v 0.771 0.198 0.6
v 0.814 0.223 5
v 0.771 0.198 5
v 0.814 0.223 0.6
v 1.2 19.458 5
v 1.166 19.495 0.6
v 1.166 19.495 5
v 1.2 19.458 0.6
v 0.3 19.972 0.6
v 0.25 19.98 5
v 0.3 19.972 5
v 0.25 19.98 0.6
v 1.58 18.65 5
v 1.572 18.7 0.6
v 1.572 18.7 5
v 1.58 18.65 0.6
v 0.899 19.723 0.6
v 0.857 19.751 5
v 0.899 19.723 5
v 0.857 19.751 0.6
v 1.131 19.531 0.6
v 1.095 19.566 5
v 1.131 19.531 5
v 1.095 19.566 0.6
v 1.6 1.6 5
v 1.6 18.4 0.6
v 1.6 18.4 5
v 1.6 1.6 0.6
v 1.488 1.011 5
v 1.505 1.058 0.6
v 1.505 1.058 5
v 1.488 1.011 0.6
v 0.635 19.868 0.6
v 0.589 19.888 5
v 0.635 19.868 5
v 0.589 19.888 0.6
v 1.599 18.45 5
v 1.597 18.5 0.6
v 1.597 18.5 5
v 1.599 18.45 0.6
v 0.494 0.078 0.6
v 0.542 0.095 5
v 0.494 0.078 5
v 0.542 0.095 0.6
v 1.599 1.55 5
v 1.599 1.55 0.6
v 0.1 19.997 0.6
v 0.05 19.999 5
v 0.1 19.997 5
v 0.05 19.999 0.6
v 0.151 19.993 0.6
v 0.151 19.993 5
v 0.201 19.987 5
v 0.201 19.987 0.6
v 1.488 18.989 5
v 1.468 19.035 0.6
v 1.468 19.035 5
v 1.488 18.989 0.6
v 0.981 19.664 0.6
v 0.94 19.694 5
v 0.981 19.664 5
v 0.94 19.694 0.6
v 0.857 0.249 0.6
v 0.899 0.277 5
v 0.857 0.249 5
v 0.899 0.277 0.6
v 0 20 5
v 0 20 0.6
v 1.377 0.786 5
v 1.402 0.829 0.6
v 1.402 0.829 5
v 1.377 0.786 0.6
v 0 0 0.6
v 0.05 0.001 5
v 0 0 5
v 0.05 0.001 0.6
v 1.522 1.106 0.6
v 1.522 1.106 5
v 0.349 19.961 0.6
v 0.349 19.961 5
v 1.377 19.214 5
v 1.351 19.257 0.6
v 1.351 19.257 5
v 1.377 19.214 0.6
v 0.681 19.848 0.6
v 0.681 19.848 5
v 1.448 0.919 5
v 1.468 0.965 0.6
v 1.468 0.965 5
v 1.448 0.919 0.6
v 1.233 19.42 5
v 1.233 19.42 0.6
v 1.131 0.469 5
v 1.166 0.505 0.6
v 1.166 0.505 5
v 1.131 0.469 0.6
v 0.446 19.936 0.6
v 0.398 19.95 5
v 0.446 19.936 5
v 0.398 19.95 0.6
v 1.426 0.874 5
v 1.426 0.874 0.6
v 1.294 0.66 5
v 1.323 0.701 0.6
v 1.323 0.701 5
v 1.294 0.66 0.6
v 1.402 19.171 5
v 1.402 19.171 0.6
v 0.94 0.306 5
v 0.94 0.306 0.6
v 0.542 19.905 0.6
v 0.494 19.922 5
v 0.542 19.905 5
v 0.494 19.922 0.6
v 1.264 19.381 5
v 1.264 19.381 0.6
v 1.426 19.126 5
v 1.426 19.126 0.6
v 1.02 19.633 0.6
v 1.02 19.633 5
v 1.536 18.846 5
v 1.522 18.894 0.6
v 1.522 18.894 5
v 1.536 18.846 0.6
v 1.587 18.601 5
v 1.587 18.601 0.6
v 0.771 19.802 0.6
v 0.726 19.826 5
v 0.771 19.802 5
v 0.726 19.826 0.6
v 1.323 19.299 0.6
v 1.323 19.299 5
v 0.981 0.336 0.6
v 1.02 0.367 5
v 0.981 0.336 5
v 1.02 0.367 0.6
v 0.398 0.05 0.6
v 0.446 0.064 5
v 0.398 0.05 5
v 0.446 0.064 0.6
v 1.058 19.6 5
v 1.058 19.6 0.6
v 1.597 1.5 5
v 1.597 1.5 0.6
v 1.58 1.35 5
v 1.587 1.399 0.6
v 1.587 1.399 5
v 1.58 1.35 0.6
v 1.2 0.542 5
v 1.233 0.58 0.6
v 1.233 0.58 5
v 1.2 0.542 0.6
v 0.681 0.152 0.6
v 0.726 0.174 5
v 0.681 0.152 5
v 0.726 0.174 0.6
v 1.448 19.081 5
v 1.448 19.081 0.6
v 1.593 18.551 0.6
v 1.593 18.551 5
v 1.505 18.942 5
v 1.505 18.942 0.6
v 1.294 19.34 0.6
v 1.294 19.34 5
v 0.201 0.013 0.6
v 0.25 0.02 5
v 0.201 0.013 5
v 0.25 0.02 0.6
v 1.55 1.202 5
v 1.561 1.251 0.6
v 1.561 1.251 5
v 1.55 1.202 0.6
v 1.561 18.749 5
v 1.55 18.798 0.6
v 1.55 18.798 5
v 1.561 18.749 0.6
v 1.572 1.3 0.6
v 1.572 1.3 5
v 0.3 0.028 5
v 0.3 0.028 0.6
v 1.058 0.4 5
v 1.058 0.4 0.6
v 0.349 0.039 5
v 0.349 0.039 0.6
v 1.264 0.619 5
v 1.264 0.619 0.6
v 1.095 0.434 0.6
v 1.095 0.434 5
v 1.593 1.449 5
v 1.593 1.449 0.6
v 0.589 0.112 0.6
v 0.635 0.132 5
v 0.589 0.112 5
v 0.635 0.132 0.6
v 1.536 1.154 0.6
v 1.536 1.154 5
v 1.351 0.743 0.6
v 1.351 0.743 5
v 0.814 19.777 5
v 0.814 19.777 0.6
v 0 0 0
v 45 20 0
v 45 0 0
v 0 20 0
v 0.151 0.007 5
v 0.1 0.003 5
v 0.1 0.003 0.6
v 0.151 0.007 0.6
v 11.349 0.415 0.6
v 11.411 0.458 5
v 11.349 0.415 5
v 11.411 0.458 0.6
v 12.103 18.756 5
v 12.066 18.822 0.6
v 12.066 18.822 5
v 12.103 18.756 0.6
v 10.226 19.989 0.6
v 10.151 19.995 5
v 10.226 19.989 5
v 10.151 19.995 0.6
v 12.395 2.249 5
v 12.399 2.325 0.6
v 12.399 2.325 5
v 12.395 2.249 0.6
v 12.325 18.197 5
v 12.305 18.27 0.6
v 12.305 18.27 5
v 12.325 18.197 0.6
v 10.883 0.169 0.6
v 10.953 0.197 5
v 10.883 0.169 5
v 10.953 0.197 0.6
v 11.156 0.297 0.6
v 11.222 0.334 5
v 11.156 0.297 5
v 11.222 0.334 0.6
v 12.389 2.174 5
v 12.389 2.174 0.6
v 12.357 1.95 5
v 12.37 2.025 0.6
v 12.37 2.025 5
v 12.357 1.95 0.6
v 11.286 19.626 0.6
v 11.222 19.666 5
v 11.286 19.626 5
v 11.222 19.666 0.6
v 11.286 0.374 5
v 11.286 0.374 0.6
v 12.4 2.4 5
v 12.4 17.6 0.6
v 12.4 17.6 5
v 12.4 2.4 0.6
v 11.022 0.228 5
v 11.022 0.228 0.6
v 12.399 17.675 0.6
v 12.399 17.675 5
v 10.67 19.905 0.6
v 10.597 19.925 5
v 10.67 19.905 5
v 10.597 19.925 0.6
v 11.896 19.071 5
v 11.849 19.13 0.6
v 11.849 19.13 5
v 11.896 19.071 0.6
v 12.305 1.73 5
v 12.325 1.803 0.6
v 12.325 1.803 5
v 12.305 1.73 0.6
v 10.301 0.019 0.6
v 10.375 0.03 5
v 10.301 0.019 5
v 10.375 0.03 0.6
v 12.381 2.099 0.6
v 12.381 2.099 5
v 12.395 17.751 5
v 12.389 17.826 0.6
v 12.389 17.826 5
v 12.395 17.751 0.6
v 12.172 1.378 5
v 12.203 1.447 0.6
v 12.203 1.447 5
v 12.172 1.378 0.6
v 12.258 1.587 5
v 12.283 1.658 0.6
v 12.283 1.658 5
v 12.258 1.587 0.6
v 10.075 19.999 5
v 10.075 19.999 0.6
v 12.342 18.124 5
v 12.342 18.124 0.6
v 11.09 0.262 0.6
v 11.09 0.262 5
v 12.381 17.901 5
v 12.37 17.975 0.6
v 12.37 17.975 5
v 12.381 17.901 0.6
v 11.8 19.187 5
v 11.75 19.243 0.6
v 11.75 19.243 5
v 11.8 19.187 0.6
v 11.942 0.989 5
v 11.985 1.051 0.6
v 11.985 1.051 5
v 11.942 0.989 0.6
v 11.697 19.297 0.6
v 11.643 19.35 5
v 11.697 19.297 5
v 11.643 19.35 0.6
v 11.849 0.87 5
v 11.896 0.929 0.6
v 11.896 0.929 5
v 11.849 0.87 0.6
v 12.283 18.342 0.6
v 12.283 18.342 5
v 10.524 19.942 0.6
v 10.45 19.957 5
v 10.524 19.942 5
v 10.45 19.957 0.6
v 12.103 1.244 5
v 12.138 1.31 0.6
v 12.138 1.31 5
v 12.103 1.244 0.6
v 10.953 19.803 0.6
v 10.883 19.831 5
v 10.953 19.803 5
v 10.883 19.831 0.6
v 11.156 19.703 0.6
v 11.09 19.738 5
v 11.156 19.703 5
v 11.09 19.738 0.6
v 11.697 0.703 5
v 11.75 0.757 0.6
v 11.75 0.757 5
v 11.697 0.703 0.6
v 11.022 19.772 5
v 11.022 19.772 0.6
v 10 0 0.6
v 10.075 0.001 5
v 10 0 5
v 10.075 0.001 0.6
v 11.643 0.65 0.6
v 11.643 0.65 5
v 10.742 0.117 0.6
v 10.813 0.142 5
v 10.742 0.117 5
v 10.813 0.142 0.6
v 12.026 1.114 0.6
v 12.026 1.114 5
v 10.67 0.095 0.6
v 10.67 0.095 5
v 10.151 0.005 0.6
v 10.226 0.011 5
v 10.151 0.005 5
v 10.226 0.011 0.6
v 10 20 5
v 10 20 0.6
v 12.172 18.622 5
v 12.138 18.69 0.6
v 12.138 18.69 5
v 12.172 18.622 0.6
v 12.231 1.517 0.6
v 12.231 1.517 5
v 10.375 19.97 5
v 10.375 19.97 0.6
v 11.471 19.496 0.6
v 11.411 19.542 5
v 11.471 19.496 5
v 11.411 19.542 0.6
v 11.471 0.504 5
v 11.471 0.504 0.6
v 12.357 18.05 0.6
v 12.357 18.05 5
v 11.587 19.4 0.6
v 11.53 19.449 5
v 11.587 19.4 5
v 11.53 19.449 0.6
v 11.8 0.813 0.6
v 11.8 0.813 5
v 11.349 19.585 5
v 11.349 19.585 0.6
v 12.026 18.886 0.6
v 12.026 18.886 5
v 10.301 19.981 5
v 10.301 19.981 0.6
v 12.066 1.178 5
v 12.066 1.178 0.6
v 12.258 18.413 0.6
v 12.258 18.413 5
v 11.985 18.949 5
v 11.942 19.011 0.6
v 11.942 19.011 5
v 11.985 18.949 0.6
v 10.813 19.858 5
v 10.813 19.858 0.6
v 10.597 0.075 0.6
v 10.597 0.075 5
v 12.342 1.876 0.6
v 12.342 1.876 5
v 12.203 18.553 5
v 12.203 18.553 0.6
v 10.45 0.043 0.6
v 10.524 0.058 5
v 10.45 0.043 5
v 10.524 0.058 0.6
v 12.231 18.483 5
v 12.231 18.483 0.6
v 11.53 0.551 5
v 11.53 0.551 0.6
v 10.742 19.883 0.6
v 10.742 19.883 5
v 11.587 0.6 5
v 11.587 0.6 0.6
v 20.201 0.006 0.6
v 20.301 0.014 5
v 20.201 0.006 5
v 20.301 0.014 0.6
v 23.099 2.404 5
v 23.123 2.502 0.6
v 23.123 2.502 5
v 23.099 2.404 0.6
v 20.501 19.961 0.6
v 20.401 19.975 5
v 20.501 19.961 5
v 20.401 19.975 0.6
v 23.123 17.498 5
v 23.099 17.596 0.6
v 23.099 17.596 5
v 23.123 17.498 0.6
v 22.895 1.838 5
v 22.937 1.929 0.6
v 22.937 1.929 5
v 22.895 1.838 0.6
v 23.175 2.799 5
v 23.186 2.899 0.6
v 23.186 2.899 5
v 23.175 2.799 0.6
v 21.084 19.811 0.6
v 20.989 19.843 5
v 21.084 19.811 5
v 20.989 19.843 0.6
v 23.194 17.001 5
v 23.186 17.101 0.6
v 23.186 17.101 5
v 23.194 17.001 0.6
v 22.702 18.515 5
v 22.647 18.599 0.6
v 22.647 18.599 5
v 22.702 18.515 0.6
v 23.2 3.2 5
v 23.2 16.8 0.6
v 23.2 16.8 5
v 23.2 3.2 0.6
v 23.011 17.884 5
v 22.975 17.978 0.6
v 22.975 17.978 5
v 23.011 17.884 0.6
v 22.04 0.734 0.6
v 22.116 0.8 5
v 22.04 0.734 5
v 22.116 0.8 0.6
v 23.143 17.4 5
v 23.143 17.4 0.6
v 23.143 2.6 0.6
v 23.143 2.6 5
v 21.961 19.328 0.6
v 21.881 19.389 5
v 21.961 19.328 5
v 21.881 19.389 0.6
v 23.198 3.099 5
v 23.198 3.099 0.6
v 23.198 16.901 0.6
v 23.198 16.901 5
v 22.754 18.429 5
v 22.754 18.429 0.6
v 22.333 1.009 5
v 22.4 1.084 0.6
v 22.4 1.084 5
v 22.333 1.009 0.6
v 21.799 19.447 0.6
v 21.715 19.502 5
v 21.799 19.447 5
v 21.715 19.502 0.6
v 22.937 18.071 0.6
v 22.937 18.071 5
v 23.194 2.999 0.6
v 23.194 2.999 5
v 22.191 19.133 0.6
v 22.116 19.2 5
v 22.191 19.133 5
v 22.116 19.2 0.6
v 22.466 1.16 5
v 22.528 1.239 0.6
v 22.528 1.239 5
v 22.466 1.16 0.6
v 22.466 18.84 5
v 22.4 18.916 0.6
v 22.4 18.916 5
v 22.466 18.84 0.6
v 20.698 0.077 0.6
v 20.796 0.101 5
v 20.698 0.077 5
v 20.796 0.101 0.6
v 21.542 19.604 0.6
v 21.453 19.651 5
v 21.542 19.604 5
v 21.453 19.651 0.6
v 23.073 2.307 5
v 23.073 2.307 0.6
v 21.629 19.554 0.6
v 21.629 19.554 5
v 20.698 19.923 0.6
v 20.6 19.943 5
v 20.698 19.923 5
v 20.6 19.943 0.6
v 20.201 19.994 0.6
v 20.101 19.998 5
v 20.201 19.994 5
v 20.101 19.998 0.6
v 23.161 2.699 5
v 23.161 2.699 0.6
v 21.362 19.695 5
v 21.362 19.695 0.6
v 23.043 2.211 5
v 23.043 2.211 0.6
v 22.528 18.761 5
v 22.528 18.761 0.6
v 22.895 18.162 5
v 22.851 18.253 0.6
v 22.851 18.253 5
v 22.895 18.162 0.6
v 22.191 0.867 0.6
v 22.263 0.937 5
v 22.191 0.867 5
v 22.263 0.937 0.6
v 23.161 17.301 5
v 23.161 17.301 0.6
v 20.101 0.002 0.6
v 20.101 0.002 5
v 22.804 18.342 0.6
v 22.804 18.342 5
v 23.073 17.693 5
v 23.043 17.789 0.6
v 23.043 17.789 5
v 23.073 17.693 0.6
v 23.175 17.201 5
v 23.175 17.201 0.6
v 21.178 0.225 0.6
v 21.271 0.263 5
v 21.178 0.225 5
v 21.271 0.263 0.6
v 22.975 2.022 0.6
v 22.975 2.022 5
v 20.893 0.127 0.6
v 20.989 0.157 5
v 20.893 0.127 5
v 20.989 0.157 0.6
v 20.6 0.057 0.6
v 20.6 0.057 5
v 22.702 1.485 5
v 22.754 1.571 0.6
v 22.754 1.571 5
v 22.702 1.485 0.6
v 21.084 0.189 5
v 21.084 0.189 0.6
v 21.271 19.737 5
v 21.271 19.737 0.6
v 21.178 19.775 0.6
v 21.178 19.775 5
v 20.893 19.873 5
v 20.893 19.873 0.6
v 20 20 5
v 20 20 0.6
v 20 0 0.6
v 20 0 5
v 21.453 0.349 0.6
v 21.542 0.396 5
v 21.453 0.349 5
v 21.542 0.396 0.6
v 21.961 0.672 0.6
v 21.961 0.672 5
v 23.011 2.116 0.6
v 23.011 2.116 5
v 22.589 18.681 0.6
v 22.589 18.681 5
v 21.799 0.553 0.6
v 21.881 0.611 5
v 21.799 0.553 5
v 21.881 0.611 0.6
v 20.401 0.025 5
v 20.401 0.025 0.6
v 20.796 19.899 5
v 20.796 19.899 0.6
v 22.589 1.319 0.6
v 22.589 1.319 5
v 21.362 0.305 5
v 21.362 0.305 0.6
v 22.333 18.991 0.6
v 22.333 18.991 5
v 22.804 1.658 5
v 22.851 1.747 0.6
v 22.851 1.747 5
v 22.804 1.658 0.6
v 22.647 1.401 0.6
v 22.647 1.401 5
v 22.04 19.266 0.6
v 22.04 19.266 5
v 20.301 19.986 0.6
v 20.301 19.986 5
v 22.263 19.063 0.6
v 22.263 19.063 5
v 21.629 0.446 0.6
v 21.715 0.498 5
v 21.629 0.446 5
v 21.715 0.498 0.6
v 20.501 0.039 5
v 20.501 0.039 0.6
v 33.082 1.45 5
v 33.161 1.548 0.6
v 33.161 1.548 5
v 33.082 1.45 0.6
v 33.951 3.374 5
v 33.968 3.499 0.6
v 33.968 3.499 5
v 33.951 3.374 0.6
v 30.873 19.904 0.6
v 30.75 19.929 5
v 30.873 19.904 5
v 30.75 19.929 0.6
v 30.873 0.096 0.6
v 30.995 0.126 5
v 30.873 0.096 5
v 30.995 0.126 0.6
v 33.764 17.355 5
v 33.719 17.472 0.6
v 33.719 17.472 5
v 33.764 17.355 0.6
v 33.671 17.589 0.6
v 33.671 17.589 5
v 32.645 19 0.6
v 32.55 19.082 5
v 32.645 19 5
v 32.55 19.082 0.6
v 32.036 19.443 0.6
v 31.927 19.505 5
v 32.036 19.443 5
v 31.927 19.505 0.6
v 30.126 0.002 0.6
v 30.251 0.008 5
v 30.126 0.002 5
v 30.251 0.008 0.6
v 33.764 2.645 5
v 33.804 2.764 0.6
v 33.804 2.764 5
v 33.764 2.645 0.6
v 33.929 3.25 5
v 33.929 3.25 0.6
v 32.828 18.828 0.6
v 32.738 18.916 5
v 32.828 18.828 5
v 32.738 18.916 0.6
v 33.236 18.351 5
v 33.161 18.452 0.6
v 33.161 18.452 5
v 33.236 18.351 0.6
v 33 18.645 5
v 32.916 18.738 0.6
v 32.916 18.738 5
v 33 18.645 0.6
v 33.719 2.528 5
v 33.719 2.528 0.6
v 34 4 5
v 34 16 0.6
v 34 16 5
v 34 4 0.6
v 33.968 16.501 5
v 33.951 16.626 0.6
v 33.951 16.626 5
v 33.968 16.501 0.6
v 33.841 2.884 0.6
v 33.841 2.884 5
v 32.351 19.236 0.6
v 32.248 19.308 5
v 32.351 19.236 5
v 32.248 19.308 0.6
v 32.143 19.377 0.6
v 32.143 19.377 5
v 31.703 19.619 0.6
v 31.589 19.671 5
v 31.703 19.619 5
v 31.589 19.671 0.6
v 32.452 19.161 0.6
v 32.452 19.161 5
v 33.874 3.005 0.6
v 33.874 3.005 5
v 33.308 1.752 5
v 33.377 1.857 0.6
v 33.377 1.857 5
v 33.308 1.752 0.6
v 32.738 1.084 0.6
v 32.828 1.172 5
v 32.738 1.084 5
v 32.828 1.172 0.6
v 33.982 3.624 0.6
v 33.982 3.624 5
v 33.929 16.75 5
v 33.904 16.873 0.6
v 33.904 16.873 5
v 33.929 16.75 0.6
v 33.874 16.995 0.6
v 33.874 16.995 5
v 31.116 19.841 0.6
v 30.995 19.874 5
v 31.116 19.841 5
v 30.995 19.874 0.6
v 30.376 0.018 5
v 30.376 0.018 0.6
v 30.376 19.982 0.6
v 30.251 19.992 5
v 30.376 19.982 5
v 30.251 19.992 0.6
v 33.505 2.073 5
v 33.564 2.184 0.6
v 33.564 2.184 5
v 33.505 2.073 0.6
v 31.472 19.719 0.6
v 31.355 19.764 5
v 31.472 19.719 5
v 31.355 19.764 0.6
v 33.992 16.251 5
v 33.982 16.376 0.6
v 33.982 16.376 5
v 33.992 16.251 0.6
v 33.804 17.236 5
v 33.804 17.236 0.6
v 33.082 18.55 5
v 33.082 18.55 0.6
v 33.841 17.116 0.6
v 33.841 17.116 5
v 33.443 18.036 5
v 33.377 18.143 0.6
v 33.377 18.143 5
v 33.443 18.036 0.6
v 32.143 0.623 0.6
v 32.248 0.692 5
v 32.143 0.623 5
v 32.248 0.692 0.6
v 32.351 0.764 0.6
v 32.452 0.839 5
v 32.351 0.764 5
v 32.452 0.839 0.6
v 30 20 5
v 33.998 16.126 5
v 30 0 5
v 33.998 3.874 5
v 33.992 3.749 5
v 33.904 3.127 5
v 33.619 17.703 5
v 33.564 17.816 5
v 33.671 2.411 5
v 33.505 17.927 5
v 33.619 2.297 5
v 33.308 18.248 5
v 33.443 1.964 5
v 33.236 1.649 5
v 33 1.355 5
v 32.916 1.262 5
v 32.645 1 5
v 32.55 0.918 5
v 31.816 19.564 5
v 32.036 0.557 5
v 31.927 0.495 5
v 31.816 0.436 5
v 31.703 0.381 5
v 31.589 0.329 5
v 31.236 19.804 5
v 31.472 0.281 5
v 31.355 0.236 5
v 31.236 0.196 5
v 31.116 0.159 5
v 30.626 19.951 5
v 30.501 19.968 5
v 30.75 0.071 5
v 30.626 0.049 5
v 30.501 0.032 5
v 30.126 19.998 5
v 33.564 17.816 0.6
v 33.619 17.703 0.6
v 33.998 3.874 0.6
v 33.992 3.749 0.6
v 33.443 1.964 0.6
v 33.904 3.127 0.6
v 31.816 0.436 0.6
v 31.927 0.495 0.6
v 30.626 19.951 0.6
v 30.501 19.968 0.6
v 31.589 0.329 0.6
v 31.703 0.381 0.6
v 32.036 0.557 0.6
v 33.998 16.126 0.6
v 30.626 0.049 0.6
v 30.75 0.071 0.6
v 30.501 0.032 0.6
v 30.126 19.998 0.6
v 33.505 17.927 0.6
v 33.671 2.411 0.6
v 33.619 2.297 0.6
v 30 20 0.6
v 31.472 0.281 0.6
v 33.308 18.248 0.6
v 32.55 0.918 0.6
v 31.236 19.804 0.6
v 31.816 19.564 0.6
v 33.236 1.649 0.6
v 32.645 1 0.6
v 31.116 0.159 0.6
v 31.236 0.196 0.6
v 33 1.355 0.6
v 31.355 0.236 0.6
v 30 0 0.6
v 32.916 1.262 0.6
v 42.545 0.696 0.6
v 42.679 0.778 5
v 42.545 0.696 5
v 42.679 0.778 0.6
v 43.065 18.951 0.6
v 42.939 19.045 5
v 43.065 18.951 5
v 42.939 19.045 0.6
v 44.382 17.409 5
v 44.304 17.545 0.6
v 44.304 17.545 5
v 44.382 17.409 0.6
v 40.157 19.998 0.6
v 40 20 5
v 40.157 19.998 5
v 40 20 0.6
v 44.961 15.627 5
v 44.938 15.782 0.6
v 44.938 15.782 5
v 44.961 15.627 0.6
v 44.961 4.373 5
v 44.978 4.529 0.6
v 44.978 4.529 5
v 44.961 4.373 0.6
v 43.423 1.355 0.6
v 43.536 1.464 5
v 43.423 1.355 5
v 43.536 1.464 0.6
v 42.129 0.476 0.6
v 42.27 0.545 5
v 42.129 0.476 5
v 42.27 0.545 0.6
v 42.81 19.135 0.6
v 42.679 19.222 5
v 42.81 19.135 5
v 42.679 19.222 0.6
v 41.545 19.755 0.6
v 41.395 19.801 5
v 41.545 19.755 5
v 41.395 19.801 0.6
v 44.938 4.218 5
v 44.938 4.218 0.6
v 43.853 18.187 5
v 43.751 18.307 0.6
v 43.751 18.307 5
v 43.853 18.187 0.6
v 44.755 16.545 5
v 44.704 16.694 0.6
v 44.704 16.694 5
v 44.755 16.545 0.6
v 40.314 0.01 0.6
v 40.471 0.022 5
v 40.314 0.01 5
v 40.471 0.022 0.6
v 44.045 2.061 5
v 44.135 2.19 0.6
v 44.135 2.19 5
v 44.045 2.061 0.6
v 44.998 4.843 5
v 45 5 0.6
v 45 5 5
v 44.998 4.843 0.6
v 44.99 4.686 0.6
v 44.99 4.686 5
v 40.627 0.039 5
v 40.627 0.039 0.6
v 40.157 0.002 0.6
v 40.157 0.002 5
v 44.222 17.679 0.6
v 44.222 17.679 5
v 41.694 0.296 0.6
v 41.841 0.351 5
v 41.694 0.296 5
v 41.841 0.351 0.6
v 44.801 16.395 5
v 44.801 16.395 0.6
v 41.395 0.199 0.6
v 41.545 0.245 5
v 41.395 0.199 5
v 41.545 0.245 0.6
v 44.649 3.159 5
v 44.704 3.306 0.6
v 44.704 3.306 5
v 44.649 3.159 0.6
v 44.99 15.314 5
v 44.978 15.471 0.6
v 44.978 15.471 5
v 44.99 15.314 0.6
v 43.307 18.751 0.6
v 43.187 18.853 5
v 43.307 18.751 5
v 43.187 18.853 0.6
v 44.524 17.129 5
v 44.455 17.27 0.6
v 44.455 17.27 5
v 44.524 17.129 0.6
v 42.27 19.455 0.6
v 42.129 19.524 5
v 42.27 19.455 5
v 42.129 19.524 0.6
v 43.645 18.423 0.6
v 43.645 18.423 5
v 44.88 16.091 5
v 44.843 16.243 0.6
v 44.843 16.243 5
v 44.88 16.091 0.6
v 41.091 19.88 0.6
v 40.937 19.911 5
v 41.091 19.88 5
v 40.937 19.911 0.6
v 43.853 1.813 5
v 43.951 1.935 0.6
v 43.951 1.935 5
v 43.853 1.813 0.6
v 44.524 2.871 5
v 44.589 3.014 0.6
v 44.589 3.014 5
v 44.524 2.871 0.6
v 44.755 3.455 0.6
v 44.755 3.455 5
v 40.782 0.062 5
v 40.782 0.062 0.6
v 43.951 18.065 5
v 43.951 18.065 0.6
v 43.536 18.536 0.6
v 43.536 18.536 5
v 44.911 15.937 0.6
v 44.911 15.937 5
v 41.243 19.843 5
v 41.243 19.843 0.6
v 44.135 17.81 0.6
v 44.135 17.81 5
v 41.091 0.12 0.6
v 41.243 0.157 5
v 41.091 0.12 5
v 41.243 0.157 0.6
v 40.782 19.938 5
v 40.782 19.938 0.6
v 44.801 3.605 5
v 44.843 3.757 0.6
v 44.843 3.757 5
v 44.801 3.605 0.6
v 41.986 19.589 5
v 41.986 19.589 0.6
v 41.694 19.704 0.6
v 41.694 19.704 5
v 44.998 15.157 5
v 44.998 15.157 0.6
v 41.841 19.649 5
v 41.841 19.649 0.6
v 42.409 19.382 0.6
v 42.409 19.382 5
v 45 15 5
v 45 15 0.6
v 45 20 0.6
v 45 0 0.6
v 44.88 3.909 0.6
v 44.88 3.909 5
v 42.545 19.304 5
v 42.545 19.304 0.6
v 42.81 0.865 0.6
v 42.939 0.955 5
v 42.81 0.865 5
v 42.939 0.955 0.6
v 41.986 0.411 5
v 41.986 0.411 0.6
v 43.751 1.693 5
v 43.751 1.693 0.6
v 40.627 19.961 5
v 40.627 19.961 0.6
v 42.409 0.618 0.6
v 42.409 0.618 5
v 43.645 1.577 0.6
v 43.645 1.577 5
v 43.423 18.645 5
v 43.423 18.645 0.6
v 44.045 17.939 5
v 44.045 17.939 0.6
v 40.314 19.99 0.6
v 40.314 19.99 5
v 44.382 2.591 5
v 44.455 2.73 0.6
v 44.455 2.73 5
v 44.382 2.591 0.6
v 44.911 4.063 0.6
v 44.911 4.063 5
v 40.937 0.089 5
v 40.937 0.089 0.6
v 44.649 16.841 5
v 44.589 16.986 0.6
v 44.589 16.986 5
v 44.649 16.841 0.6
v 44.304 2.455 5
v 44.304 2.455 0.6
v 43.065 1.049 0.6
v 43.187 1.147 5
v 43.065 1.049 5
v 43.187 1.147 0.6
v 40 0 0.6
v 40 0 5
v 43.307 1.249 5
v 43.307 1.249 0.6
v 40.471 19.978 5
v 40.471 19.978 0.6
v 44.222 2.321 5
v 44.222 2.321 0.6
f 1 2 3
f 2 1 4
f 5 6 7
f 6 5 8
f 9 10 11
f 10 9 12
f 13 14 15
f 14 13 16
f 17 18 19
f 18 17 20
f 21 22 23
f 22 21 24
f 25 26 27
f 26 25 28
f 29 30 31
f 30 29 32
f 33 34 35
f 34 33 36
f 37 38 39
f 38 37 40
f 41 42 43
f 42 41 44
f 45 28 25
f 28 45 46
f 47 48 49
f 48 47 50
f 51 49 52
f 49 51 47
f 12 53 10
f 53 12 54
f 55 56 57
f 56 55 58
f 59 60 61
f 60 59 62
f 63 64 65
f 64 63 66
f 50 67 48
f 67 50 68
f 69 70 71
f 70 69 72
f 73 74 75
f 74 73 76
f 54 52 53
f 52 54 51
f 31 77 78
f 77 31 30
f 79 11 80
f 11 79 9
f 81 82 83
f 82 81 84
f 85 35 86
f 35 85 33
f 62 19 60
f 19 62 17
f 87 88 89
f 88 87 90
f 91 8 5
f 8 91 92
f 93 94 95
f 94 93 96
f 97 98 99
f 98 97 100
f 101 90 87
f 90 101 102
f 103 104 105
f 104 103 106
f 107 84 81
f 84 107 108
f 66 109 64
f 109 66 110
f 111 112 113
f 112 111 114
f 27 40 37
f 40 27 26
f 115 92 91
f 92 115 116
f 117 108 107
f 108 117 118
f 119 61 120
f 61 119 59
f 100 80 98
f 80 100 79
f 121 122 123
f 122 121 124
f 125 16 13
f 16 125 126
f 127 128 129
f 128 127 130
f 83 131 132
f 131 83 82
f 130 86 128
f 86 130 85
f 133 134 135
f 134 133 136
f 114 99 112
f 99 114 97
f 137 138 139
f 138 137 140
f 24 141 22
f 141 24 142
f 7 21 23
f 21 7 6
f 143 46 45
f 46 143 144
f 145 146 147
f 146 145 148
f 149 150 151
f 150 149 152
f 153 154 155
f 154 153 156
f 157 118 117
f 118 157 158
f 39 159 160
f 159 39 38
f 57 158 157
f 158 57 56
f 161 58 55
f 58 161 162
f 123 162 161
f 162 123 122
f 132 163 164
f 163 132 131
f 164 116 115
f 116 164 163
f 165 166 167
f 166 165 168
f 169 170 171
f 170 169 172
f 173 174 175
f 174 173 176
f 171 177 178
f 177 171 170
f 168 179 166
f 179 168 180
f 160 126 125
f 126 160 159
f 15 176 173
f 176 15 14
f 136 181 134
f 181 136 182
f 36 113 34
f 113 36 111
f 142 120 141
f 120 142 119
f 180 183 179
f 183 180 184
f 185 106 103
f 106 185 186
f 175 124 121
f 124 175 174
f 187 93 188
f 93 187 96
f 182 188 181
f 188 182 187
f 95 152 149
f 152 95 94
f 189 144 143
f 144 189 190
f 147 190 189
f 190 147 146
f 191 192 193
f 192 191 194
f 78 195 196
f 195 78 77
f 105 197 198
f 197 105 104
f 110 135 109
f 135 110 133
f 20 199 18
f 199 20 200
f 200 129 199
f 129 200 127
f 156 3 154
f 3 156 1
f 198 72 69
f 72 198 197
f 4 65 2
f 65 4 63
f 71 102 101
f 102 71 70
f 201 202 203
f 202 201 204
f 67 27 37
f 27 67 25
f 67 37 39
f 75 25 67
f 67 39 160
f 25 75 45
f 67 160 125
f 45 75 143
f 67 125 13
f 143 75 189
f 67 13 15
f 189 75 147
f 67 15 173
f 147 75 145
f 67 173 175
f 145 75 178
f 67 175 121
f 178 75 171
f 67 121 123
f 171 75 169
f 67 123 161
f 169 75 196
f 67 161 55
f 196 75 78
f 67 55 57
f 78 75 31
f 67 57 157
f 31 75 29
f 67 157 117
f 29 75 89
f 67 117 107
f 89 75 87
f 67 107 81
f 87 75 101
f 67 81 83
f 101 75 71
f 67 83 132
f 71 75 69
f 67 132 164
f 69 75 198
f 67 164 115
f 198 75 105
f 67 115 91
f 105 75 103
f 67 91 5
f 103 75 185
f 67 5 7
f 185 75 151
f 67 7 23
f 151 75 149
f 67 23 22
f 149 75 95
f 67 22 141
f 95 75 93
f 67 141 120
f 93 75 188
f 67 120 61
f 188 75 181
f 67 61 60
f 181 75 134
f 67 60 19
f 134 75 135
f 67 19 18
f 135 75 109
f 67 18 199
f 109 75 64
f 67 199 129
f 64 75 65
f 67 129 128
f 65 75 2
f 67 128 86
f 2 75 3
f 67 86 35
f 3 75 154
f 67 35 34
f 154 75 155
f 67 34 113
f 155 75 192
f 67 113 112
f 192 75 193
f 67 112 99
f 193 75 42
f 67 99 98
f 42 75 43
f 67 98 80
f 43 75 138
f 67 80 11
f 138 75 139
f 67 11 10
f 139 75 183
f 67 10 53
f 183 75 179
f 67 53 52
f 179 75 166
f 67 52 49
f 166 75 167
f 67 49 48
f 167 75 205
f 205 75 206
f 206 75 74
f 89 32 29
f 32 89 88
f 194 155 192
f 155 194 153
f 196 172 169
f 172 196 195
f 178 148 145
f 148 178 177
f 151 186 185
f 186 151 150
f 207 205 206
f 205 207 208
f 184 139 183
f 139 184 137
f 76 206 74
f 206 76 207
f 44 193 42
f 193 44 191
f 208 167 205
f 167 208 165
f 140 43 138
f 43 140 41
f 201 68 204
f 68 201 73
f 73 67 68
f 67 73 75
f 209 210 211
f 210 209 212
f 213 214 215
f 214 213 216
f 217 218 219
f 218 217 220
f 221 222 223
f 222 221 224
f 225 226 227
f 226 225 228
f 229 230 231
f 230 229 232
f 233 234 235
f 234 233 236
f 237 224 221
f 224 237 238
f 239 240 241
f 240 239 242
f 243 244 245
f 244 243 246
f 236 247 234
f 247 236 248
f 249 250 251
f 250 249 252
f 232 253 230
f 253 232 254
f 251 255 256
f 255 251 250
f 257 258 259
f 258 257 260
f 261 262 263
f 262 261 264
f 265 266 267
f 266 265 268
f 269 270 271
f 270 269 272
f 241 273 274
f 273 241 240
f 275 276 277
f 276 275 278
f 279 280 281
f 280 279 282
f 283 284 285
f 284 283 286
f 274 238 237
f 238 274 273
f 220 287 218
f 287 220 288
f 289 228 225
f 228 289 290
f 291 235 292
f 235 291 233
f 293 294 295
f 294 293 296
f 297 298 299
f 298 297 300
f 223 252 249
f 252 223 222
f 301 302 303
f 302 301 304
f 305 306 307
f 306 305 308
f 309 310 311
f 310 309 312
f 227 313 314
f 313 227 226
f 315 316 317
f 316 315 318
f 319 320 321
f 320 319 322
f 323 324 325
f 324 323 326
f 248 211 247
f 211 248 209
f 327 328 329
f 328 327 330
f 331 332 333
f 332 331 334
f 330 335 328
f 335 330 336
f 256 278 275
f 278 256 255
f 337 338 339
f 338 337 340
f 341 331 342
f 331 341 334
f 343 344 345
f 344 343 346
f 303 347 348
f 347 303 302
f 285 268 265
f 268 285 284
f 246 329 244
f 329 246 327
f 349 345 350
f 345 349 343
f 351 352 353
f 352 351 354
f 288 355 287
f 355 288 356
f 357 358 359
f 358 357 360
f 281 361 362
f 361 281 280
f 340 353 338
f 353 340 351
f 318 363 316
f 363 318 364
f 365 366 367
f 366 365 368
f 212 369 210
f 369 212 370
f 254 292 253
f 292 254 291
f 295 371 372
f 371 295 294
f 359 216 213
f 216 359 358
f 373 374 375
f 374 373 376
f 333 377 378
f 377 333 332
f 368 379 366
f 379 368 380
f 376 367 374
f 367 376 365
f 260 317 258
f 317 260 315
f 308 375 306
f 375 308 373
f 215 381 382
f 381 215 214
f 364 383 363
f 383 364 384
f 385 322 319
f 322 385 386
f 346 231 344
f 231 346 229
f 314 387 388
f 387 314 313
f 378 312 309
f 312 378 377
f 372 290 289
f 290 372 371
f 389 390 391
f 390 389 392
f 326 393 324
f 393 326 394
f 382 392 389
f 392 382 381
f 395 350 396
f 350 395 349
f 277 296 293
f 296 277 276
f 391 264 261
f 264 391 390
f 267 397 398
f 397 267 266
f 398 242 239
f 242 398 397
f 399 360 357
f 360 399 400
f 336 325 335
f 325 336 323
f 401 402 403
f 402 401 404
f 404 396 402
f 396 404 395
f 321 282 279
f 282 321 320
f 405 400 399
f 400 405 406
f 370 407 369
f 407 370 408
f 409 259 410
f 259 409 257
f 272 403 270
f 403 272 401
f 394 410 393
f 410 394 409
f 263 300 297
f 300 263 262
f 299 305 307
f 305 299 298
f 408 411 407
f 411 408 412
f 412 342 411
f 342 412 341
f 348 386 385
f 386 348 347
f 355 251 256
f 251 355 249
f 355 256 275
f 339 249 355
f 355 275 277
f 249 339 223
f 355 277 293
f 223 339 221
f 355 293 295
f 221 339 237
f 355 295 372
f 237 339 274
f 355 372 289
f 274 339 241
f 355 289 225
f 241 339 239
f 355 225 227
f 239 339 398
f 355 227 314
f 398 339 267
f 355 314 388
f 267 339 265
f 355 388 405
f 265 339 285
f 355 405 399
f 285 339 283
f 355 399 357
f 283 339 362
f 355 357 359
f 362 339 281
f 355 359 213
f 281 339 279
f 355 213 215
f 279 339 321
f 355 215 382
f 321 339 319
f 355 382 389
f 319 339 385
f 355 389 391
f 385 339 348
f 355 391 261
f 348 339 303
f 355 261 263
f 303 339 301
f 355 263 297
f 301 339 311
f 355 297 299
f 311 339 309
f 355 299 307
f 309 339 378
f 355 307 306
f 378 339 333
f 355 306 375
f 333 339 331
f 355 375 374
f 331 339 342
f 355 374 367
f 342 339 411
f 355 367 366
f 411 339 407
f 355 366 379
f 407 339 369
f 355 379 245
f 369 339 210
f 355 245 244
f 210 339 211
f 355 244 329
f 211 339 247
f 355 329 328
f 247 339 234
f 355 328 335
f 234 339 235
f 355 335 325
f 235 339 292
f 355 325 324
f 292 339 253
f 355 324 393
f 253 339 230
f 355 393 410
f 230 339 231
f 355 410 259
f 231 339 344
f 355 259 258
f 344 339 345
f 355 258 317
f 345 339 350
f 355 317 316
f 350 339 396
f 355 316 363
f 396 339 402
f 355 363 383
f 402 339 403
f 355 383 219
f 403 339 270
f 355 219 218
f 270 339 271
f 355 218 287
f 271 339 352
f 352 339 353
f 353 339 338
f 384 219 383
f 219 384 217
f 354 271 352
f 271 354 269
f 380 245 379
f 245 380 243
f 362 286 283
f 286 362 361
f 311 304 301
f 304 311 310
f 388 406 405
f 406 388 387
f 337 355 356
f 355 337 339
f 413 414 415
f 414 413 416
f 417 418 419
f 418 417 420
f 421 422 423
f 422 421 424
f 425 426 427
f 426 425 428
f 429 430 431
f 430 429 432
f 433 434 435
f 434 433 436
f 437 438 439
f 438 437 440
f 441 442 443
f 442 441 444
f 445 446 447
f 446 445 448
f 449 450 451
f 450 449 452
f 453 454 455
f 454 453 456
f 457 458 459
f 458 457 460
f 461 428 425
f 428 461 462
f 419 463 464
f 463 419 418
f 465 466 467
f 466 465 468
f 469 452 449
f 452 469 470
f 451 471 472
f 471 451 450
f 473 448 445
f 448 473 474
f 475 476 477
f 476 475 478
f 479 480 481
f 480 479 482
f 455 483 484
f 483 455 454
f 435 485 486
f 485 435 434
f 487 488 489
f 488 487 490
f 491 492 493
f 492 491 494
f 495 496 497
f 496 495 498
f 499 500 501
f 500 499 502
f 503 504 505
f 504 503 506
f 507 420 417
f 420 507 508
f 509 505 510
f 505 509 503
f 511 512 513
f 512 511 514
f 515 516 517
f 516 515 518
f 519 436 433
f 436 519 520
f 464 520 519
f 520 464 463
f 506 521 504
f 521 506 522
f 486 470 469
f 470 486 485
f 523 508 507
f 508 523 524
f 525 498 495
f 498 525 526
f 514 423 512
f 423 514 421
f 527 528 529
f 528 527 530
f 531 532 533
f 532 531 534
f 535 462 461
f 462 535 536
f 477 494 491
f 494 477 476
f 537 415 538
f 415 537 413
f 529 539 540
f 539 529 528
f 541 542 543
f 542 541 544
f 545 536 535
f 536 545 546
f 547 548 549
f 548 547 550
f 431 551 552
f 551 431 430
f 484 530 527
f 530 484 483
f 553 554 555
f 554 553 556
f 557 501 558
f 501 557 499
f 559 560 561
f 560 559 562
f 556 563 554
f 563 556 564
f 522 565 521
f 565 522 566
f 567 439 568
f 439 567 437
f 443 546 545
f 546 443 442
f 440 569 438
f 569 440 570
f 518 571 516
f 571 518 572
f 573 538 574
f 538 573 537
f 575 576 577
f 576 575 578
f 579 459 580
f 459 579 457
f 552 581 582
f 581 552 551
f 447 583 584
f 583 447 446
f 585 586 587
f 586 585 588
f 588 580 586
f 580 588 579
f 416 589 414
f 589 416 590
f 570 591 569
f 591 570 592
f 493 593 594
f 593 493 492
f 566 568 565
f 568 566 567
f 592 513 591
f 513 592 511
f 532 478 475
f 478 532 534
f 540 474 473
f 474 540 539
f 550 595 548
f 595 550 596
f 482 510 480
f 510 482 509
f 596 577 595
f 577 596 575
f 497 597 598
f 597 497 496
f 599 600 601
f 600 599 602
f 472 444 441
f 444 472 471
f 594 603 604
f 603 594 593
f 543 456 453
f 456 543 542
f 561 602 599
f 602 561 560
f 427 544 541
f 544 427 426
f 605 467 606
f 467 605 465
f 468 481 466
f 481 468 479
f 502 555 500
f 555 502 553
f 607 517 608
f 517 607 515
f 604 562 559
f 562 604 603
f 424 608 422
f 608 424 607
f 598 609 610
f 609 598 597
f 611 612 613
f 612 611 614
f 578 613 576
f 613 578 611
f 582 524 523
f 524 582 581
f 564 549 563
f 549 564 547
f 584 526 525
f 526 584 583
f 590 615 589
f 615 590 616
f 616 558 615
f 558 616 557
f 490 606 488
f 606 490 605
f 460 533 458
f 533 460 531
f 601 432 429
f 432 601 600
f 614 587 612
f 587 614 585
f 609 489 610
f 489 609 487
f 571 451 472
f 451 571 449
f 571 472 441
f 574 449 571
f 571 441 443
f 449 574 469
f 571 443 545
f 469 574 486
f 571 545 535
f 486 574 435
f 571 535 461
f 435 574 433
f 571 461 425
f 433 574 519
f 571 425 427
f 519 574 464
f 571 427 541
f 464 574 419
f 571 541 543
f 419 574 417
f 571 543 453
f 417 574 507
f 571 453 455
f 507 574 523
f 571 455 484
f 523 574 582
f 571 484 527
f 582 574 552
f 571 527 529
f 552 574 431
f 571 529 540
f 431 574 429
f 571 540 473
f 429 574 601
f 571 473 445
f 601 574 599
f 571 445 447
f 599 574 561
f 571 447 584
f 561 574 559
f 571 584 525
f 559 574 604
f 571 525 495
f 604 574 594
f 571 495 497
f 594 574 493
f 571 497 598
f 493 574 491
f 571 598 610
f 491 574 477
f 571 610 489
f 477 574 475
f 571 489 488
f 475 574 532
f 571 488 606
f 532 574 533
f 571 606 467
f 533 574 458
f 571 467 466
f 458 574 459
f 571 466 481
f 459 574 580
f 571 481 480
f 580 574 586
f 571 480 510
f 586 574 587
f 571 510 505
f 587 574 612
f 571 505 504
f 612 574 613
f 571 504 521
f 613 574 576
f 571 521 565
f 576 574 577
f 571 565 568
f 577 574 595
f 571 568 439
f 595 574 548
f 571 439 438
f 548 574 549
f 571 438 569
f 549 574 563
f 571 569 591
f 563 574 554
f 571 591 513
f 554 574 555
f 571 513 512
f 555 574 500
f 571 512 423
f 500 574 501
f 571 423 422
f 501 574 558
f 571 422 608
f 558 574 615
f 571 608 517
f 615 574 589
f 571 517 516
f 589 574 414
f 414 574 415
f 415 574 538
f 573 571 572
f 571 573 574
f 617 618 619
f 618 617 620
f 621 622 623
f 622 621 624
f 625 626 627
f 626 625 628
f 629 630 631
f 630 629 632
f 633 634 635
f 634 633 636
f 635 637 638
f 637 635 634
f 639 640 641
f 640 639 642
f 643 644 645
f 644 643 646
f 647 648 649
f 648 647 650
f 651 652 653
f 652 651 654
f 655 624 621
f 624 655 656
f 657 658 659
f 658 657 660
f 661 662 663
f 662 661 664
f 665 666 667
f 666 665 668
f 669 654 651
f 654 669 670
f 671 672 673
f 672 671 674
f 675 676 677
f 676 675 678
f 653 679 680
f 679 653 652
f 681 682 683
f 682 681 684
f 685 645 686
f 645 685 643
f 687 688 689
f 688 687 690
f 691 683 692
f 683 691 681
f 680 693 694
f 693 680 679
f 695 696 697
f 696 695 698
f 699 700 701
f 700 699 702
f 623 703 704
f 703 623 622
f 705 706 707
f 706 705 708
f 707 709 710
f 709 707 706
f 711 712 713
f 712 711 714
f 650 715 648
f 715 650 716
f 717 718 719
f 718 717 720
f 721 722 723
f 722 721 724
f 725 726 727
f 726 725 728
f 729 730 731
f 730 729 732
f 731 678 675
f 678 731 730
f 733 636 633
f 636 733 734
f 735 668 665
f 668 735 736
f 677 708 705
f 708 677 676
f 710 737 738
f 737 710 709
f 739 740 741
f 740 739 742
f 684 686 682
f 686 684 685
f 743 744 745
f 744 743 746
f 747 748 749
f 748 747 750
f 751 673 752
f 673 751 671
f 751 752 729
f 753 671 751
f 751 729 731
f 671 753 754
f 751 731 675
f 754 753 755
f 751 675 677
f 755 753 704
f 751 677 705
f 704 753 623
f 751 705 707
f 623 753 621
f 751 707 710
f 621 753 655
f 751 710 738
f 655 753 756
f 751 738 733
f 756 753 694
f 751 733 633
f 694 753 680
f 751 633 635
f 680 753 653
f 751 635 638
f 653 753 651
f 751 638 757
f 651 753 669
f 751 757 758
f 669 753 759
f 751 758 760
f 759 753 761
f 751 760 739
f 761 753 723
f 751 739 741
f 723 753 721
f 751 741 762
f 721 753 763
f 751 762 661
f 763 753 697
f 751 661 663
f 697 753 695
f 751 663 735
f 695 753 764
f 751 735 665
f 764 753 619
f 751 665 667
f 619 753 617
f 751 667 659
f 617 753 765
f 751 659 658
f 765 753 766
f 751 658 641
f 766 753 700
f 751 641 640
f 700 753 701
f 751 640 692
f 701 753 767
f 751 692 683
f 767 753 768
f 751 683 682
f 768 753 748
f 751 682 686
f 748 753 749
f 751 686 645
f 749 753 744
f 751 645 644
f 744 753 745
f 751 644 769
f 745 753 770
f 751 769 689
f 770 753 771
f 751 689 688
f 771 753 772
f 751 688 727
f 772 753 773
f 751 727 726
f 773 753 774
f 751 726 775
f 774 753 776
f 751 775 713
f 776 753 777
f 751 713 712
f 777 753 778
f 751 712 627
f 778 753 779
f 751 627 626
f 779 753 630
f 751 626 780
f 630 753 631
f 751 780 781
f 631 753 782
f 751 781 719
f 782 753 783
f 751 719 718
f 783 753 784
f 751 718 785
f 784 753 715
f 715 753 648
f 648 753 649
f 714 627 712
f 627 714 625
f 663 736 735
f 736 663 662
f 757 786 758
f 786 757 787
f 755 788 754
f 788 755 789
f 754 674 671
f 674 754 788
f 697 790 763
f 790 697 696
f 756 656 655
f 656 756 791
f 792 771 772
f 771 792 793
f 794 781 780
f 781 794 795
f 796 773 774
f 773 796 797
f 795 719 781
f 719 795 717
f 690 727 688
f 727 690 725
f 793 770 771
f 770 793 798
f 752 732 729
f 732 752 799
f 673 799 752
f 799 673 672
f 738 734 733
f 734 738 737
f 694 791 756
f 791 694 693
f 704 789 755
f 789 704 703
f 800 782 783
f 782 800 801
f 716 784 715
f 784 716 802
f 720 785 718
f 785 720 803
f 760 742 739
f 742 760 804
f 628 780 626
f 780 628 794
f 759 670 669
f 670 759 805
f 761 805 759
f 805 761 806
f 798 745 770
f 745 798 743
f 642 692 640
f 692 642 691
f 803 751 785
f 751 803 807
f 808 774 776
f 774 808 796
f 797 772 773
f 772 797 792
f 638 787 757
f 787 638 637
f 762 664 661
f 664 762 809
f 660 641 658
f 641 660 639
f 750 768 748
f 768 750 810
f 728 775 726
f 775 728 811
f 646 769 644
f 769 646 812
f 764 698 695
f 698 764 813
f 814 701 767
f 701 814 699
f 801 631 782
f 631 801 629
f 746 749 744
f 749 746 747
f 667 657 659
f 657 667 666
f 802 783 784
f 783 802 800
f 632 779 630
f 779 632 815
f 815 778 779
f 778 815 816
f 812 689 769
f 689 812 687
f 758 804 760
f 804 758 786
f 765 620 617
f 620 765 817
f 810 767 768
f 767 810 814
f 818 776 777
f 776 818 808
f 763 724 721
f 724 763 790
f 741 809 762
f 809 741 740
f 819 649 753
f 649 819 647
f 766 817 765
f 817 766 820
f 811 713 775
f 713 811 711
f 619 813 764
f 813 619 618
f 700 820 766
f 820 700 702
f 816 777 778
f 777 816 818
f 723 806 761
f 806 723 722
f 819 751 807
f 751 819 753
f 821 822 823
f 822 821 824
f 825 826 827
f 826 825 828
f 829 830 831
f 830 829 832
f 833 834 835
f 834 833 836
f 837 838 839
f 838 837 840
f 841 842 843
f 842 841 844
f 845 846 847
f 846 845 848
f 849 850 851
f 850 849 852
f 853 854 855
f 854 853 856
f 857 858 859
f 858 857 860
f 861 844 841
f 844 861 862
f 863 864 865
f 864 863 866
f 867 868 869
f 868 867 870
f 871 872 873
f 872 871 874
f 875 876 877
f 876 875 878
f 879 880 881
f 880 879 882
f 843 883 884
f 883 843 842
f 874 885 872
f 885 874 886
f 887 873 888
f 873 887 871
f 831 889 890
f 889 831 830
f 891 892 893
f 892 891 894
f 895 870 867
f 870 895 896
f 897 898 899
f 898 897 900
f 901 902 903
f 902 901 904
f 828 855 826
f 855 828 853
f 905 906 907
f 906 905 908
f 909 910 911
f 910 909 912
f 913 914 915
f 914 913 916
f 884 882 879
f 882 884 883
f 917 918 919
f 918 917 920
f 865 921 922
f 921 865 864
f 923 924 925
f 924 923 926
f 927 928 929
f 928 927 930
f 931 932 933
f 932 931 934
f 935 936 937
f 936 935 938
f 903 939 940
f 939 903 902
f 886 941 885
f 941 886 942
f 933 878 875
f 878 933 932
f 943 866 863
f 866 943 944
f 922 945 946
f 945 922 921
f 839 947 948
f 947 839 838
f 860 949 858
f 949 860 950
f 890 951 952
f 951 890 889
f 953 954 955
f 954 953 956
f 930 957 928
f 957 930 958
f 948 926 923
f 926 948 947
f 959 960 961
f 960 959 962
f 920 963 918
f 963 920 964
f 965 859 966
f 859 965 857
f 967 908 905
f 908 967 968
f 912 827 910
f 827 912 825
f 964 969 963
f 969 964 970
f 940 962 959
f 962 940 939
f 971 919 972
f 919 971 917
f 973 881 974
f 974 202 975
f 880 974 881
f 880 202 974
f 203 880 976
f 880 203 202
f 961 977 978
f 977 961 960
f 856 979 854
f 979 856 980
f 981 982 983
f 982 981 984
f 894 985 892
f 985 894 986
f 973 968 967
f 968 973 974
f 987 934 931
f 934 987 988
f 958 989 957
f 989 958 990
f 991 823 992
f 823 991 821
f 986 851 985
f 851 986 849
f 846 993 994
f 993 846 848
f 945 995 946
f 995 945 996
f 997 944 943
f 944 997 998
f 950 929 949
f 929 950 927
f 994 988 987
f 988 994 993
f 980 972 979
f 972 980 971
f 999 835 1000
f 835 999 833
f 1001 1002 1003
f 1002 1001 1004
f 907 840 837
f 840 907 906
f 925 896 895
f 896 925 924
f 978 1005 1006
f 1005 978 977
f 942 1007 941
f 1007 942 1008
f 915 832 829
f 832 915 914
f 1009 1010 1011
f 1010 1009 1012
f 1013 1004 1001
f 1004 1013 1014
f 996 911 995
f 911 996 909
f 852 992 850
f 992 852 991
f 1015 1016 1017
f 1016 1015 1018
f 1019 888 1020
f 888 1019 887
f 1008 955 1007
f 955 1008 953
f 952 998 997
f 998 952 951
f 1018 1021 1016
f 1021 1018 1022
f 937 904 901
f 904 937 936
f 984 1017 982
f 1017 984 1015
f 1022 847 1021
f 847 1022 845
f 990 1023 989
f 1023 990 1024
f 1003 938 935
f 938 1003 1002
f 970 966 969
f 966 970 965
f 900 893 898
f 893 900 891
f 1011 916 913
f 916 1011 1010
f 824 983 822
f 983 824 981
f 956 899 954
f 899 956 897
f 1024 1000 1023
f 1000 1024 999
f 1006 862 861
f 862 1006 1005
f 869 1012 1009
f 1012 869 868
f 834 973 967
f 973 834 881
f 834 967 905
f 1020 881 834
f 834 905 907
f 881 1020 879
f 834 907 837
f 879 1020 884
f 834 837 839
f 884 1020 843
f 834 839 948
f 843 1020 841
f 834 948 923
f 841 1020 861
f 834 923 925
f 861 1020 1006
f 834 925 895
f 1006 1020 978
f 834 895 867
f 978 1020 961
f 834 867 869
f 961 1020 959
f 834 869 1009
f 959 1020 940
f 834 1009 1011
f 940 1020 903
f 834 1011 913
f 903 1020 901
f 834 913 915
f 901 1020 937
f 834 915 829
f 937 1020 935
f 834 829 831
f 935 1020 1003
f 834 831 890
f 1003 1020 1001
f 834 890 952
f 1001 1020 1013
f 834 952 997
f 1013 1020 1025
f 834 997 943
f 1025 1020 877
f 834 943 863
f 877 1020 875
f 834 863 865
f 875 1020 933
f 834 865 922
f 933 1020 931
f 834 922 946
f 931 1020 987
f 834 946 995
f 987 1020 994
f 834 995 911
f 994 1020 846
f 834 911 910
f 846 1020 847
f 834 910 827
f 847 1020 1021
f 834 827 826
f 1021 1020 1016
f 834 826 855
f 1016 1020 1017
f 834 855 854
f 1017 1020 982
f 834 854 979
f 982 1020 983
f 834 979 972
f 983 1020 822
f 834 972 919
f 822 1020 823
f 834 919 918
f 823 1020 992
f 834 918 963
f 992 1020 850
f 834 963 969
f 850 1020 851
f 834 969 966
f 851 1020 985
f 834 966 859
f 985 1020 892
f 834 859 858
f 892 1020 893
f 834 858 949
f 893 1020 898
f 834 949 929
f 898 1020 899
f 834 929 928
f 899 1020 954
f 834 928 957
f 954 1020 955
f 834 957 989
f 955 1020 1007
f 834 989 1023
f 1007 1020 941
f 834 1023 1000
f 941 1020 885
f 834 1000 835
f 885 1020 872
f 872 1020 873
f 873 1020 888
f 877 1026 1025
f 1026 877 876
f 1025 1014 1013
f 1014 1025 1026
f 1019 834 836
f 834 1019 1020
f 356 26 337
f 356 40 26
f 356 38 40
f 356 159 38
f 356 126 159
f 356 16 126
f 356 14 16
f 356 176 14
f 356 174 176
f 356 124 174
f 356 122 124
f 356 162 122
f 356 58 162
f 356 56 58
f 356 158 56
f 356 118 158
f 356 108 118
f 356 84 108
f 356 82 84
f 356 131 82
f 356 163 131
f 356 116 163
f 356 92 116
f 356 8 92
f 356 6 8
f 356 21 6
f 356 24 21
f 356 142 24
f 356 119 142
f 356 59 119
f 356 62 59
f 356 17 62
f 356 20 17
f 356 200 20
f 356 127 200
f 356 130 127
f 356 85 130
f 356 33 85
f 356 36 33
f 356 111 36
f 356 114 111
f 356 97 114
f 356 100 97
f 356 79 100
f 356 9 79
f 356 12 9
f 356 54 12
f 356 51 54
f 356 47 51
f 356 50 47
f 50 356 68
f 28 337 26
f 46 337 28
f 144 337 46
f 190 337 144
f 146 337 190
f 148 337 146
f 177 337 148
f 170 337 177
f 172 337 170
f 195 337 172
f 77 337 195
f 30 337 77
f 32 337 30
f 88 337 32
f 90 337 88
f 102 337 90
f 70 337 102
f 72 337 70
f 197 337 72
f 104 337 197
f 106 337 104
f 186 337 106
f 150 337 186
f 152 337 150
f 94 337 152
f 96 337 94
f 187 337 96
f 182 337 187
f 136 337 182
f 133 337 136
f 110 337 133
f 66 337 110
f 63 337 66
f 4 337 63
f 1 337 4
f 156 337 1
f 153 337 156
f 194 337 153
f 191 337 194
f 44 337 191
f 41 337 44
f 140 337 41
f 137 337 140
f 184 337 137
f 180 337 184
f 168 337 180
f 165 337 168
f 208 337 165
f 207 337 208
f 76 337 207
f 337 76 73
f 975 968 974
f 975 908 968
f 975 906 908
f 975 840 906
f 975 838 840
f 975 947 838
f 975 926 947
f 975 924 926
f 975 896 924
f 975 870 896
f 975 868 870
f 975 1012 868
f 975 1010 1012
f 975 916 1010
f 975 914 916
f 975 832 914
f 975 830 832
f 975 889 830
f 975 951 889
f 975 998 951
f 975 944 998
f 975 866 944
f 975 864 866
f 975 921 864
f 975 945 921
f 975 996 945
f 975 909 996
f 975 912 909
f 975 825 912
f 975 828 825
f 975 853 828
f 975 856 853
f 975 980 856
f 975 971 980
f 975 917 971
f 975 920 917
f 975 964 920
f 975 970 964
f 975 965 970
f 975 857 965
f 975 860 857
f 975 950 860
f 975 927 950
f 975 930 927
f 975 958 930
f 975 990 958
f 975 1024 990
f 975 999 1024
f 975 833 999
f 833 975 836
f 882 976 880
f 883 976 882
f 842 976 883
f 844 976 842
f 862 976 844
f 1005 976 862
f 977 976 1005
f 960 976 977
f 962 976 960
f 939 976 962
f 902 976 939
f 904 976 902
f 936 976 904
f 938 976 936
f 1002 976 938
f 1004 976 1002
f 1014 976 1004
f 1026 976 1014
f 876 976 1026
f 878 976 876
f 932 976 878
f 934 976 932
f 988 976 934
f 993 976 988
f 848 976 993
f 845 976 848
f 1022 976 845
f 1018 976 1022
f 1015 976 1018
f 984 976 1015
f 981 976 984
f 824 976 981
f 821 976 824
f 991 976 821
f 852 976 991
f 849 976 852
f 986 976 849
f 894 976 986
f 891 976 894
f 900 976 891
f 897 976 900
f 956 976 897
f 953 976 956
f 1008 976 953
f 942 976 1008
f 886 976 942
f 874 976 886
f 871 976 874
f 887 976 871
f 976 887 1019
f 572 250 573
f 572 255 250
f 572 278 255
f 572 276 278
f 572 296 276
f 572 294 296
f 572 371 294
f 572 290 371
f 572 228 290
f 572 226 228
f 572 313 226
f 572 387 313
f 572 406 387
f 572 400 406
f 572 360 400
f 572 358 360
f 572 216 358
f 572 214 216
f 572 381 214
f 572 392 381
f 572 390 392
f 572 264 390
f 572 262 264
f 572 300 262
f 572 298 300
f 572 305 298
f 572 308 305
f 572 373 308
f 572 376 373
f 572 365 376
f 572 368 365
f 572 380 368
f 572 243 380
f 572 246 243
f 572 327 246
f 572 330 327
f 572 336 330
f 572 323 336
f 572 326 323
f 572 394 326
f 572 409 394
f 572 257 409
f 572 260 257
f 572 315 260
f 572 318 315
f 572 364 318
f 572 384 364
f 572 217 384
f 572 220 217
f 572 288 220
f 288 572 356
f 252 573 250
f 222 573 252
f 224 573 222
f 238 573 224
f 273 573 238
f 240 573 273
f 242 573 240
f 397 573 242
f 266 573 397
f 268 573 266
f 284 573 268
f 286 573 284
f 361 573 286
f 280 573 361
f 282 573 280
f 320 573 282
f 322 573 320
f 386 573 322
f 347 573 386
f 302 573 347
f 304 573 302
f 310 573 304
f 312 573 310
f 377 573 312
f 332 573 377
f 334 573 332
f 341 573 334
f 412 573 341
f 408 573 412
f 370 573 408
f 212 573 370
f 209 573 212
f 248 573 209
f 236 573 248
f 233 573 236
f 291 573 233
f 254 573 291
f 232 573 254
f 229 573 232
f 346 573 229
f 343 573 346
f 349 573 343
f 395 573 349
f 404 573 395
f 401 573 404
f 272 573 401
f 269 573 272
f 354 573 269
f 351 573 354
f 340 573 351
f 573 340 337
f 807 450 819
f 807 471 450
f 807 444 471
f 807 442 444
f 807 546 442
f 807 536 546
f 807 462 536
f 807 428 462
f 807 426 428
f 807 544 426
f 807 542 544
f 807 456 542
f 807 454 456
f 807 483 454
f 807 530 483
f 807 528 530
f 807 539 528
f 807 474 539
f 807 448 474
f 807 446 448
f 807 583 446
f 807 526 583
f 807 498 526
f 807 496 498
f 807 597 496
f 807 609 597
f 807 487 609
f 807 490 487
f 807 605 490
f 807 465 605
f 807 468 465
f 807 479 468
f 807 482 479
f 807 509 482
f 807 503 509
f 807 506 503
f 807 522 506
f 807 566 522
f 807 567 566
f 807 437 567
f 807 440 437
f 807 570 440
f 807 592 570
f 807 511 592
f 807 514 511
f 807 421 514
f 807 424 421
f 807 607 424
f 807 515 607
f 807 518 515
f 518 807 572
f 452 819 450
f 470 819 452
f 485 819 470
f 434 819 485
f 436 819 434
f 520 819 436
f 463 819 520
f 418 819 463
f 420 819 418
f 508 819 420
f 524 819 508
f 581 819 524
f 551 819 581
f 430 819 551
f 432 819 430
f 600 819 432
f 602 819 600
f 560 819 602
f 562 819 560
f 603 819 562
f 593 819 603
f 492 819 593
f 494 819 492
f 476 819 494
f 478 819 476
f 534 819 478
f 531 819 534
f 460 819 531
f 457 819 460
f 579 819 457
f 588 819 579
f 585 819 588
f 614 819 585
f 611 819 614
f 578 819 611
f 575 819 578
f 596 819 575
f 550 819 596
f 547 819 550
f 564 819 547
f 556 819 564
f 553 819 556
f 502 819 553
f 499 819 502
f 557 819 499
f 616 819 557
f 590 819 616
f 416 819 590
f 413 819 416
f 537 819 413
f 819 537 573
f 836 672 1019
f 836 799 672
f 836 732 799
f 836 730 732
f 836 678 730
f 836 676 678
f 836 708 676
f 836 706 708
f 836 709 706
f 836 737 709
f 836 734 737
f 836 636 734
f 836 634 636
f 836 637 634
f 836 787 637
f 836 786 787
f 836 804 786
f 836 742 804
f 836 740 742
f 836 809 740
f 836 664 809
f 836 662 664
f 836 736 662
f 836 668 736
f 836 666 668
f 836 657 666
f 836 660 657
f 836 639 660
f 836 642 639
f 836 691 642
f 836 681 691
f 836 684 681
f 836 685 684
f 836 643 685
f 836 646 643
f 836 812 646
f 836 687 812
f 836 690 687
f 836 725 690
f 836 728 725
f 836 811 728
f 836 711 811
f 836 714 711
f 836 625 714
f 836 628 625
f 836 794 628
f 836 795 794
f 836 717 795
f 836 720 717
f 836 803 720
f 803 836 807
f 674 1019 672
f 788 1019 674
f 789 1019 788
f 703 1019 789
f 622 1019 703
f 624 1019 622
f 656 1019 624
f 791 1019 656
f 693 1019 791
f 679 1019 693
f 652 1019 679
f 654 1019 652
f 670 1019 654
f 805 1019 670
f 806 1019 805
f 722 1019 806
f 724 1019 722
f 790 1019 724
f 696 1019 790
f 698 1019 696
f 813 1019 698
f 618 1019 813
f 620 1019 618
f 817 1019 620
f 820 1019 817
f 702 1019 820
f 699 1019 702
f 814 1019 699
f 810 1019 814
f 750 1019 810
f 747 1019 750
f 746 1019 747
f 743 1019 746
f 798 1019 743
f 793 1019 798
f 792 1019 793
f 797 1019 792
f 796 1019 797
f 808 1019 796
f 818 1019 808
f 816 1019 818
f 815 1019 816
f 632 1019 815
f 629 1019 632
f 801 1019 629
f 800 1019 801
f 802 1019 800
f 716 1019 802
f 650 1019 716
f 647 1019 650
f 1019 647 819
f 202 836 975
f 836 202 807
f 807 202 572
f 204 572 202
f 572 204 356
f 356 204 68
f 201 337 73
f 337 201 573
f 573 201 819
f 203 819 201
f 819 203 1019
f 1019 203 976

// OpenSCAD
$fn=200;
lw=0.8;
cube([40+5,20,.6]);

wall(lw*2,20,5);

translate([10,0,0])
wall(lw*3,20,5);

translate([20,0,0])
wall(lw*4,20,5);

translate([30,0,0])
wall(4,20,5);

translate([40,0,0])
wall(5,20,5);


module wall(x,y,z){
    difference(){
        hull(){
            translate([0,x,0])
            cylinder(r=x,h=z);
            
            translate([0,y-x,0])
            cylinder(r=x,h=z);
        }
        
        translate([-x-.1,-.1,-.1])
        cube([x+.1,y+1,z+1]);
        
    }
}
